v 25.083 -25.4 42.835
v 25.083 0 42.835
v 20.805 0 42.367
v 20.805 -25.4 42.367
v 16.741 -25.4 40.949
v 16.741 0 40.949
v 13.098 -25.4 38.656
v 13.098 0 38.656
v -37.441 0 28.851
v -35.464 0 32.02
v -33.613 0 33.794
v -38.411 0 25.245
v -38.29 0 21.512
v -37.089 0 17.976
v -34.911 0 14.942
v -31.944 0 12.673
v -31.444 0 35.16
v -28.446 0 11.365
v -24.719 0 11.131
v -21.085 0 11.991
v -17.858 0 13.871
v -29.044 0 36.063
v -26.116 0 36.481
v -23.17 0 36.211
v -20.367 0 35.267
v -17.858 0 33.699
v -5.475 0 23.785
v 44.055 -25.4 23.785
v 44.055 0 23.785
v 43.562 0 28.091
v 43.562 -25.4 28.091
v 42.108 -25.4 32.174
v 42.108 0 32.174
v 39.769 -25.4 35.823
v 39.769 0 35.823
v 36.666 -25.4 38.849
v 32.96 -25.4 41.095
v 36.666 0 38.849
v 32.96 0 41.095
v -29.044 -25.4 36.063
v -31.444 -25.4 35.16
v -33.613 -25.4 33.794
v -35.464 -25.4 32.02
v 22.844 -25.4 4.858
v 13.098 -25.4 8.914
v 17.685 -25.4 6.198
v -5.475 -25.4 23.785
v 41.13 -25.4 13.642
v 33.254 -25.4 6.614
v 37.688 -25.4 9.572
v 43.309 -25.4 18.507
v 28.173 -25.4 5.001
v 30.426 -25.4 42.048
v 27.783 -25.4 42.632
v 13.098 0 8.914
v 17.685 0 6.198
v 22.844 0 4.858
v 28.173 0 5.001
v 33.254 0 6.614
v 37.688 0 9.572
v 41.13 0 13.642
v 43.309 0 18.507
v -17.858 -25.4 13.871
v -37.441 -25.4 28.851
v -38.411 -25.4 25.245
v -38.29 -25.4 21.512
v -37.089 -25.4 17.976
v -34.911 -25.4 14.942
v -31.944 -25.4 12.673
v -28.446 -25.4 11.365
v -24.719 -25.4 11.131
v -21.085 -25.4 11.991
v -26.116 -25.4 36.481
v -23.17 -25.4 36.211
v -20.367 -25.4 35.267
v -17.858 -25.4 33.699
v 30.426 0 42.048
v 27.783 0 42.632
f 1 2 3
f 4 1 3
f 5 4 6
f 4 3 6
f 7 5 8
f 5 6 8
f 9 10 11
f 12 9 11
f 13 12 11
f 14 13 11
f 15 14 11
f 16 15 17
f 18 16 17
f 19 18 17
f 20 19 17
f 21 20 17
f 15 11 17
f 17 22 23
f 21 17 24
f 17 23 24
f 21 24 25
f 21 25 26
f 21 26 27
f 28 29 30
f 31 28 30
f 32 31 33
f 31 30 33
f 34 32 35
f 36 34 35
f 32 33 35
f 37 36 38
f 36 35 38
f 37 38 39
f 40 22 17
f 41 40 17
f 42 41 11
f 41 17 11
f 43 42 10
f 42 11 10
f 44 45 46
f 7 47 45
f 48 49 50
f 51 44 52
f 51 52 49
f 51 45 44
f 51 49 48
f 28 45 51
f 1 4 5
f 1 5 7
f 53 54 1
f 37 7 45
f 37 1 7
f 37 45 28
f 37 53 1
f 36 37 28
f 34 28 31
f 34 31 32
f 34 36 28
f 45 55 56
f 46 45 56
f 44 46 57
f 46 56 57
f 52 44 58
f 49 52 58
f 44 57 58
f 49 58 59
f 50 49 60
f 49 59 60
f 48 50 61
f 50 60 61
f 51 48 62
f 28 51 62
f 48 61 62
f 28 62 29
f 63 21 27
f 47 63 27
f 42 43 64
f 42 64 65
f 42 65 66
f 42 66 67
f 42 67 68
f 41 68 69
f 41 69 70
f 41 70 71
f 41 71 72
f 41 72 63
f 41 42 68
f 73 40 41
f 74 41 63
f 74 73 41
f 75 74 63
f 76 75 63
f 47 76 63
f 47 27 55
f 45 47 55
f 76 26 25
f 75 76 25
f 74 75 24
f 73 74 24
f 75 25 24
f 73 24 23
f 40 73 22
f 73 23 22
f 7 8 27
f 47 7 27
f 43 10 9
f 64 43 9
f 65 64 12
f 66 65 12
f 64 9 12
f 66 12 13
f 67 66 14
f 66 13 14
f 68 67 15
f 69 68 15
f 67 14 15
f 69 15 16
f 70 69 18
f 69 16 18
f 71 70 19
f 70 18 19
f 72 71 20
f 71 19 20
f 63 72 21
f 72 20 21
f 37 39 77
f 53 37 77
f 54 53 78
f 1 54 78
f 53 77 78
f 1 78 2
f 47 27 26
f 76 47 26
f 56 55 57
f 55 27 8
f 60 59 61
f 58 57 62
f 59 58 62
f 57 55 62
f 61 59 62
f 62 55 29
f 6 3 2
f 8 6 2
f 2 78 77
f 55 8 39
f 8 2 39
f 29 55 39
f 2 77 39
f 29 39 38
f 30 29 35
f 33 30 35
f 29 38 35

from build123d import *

# Parameters (mm, degrees)
F1_DEPTH = 25.4


with BuildPart() as f1:
    # F0 (on Front) → F1 (new body)
    with BuildSketch(Plane.XZ):
        with BuildLine():
            ThreePointArc((25.083303, 42.835131), (18.732602, 41.77316), (13.098447, 38.656195))
            Line((13.098447, 38.656195), (25.004697, 23.785293))
            Line((25.004697, 23.785293), (13.098447, 8.914392))
            ThreePointArc((13.098447, 8.914392), (33.253589, 6.613855), (44.054697, 23.785293))
            ThreePointArc((44.054697, 23.785293), (41.04284, 34.065394), (32.959635, 41.09487))
            ThreePointArc((32.959635, 41.09487), (29.114634, 42.386662), (25.083303, 42.835131))
        make_face()
        with BuildLine():
            Line((5.954697, 23.785293), (-5.475303, 23.785293))
            Line((-5.475303, 23.785293), (13.098447, 8.914392))
            ThreePointArc((13.098447, 8.914392), (7.833259, 15.536401), (5.954697, 23.785293))
        make_face()
        with BuildLine():
            Line((25.004697, 23.785293), (13.098447, 38.656195))
            ThreePointArc((13.098447, 38.656195), (7.833259, 32.034185), (5.954697, 23.785293))
            Line((5.954697, 23.785293), (25.004697, 23.785293))
        make_face()
        with BuildLine():
            Line((25.004697, 23.785293), (5.954697, 23.785293))
            ThreePointArc((5.954697, 23.785293), (7.833259, 15.536401), (13.098447, 8.914392))
            Line((13.098447, 8.914392), (25.004697, 23.785293))
        make_face()
        with BuildLine():
            Line((13.098447, 38.656195), (-5.475303, 23.785293))
            Line((-5.475303, 23.785293), (5.954697, 23.785293))
            ThreePointArc((5.954697, 23.785293), (7.833259, 32.034185), (13.098447, 38.656195))
        make_face()
        with BuildLine():
            Line((-5.475303, 23.785293), (-13.095303, 23.785293))
            ThreePointArc((-13.095303, 23.785293), (-14.347678, 18.286032), (-17.857803, 13.871359))
            Line((-17.857803, 13.871359), (-5.475303, 23.785293))
        make_face()
        with BuildLine():
            Line((-25.795303, 23.785293), (-13.095303, 23.785293))
            ThreePointArc((-13.095303, 23.785293), (-14.347678, 29.284555), (-17.857803, 33.699228))
            Line((-17.857803, 33.699228), (-25.795303, 23.785293))
        make_face()
        with BuildLine():
            ThreePointArc((-17.857803, 33.699228), (-14.347678, 29.284555), (-13.095303, 23.785293))
            Line((-13.095303, 23.785293), (-5.475303, 23.785293))
            Line((-5.475303, 23.785293), (-17.857803, 33.699228))
        make_face()
        with BuildLine():
            Line((-25.795303, 23.785293), (-17.857803, 33.699228))
            ThreePointArc((-17.857803, 33.699228), (-23.169991, 36.210982), (-29.044194, 36.0627))
            ThreePointArc((-29.044194, 36.0627), (-32.563136, 34.531755), (-35.464134, 32.019595))
            ThreePointArc((-35.464134, 32.019595), (-34.91062, 14.94216), (-17.857803, 13.871359))
            Line((-17.857803, 13.871359), (-25.795303, 23.785293))
        make_face()
        with BuildLine():
            ThreePointArc((-17.857803, 13.871359), (-14.347678, 18.286032), (-13.095303, 23.785293))
            Line((-13.095303, 23.785293), (-25.795303, 23.785293))
            Line((-25.795303, 23.785293), (-17.857803, 13.871359))
        make_face()
    extrude(amount=F1_DEPTH)


solid = f1.part
